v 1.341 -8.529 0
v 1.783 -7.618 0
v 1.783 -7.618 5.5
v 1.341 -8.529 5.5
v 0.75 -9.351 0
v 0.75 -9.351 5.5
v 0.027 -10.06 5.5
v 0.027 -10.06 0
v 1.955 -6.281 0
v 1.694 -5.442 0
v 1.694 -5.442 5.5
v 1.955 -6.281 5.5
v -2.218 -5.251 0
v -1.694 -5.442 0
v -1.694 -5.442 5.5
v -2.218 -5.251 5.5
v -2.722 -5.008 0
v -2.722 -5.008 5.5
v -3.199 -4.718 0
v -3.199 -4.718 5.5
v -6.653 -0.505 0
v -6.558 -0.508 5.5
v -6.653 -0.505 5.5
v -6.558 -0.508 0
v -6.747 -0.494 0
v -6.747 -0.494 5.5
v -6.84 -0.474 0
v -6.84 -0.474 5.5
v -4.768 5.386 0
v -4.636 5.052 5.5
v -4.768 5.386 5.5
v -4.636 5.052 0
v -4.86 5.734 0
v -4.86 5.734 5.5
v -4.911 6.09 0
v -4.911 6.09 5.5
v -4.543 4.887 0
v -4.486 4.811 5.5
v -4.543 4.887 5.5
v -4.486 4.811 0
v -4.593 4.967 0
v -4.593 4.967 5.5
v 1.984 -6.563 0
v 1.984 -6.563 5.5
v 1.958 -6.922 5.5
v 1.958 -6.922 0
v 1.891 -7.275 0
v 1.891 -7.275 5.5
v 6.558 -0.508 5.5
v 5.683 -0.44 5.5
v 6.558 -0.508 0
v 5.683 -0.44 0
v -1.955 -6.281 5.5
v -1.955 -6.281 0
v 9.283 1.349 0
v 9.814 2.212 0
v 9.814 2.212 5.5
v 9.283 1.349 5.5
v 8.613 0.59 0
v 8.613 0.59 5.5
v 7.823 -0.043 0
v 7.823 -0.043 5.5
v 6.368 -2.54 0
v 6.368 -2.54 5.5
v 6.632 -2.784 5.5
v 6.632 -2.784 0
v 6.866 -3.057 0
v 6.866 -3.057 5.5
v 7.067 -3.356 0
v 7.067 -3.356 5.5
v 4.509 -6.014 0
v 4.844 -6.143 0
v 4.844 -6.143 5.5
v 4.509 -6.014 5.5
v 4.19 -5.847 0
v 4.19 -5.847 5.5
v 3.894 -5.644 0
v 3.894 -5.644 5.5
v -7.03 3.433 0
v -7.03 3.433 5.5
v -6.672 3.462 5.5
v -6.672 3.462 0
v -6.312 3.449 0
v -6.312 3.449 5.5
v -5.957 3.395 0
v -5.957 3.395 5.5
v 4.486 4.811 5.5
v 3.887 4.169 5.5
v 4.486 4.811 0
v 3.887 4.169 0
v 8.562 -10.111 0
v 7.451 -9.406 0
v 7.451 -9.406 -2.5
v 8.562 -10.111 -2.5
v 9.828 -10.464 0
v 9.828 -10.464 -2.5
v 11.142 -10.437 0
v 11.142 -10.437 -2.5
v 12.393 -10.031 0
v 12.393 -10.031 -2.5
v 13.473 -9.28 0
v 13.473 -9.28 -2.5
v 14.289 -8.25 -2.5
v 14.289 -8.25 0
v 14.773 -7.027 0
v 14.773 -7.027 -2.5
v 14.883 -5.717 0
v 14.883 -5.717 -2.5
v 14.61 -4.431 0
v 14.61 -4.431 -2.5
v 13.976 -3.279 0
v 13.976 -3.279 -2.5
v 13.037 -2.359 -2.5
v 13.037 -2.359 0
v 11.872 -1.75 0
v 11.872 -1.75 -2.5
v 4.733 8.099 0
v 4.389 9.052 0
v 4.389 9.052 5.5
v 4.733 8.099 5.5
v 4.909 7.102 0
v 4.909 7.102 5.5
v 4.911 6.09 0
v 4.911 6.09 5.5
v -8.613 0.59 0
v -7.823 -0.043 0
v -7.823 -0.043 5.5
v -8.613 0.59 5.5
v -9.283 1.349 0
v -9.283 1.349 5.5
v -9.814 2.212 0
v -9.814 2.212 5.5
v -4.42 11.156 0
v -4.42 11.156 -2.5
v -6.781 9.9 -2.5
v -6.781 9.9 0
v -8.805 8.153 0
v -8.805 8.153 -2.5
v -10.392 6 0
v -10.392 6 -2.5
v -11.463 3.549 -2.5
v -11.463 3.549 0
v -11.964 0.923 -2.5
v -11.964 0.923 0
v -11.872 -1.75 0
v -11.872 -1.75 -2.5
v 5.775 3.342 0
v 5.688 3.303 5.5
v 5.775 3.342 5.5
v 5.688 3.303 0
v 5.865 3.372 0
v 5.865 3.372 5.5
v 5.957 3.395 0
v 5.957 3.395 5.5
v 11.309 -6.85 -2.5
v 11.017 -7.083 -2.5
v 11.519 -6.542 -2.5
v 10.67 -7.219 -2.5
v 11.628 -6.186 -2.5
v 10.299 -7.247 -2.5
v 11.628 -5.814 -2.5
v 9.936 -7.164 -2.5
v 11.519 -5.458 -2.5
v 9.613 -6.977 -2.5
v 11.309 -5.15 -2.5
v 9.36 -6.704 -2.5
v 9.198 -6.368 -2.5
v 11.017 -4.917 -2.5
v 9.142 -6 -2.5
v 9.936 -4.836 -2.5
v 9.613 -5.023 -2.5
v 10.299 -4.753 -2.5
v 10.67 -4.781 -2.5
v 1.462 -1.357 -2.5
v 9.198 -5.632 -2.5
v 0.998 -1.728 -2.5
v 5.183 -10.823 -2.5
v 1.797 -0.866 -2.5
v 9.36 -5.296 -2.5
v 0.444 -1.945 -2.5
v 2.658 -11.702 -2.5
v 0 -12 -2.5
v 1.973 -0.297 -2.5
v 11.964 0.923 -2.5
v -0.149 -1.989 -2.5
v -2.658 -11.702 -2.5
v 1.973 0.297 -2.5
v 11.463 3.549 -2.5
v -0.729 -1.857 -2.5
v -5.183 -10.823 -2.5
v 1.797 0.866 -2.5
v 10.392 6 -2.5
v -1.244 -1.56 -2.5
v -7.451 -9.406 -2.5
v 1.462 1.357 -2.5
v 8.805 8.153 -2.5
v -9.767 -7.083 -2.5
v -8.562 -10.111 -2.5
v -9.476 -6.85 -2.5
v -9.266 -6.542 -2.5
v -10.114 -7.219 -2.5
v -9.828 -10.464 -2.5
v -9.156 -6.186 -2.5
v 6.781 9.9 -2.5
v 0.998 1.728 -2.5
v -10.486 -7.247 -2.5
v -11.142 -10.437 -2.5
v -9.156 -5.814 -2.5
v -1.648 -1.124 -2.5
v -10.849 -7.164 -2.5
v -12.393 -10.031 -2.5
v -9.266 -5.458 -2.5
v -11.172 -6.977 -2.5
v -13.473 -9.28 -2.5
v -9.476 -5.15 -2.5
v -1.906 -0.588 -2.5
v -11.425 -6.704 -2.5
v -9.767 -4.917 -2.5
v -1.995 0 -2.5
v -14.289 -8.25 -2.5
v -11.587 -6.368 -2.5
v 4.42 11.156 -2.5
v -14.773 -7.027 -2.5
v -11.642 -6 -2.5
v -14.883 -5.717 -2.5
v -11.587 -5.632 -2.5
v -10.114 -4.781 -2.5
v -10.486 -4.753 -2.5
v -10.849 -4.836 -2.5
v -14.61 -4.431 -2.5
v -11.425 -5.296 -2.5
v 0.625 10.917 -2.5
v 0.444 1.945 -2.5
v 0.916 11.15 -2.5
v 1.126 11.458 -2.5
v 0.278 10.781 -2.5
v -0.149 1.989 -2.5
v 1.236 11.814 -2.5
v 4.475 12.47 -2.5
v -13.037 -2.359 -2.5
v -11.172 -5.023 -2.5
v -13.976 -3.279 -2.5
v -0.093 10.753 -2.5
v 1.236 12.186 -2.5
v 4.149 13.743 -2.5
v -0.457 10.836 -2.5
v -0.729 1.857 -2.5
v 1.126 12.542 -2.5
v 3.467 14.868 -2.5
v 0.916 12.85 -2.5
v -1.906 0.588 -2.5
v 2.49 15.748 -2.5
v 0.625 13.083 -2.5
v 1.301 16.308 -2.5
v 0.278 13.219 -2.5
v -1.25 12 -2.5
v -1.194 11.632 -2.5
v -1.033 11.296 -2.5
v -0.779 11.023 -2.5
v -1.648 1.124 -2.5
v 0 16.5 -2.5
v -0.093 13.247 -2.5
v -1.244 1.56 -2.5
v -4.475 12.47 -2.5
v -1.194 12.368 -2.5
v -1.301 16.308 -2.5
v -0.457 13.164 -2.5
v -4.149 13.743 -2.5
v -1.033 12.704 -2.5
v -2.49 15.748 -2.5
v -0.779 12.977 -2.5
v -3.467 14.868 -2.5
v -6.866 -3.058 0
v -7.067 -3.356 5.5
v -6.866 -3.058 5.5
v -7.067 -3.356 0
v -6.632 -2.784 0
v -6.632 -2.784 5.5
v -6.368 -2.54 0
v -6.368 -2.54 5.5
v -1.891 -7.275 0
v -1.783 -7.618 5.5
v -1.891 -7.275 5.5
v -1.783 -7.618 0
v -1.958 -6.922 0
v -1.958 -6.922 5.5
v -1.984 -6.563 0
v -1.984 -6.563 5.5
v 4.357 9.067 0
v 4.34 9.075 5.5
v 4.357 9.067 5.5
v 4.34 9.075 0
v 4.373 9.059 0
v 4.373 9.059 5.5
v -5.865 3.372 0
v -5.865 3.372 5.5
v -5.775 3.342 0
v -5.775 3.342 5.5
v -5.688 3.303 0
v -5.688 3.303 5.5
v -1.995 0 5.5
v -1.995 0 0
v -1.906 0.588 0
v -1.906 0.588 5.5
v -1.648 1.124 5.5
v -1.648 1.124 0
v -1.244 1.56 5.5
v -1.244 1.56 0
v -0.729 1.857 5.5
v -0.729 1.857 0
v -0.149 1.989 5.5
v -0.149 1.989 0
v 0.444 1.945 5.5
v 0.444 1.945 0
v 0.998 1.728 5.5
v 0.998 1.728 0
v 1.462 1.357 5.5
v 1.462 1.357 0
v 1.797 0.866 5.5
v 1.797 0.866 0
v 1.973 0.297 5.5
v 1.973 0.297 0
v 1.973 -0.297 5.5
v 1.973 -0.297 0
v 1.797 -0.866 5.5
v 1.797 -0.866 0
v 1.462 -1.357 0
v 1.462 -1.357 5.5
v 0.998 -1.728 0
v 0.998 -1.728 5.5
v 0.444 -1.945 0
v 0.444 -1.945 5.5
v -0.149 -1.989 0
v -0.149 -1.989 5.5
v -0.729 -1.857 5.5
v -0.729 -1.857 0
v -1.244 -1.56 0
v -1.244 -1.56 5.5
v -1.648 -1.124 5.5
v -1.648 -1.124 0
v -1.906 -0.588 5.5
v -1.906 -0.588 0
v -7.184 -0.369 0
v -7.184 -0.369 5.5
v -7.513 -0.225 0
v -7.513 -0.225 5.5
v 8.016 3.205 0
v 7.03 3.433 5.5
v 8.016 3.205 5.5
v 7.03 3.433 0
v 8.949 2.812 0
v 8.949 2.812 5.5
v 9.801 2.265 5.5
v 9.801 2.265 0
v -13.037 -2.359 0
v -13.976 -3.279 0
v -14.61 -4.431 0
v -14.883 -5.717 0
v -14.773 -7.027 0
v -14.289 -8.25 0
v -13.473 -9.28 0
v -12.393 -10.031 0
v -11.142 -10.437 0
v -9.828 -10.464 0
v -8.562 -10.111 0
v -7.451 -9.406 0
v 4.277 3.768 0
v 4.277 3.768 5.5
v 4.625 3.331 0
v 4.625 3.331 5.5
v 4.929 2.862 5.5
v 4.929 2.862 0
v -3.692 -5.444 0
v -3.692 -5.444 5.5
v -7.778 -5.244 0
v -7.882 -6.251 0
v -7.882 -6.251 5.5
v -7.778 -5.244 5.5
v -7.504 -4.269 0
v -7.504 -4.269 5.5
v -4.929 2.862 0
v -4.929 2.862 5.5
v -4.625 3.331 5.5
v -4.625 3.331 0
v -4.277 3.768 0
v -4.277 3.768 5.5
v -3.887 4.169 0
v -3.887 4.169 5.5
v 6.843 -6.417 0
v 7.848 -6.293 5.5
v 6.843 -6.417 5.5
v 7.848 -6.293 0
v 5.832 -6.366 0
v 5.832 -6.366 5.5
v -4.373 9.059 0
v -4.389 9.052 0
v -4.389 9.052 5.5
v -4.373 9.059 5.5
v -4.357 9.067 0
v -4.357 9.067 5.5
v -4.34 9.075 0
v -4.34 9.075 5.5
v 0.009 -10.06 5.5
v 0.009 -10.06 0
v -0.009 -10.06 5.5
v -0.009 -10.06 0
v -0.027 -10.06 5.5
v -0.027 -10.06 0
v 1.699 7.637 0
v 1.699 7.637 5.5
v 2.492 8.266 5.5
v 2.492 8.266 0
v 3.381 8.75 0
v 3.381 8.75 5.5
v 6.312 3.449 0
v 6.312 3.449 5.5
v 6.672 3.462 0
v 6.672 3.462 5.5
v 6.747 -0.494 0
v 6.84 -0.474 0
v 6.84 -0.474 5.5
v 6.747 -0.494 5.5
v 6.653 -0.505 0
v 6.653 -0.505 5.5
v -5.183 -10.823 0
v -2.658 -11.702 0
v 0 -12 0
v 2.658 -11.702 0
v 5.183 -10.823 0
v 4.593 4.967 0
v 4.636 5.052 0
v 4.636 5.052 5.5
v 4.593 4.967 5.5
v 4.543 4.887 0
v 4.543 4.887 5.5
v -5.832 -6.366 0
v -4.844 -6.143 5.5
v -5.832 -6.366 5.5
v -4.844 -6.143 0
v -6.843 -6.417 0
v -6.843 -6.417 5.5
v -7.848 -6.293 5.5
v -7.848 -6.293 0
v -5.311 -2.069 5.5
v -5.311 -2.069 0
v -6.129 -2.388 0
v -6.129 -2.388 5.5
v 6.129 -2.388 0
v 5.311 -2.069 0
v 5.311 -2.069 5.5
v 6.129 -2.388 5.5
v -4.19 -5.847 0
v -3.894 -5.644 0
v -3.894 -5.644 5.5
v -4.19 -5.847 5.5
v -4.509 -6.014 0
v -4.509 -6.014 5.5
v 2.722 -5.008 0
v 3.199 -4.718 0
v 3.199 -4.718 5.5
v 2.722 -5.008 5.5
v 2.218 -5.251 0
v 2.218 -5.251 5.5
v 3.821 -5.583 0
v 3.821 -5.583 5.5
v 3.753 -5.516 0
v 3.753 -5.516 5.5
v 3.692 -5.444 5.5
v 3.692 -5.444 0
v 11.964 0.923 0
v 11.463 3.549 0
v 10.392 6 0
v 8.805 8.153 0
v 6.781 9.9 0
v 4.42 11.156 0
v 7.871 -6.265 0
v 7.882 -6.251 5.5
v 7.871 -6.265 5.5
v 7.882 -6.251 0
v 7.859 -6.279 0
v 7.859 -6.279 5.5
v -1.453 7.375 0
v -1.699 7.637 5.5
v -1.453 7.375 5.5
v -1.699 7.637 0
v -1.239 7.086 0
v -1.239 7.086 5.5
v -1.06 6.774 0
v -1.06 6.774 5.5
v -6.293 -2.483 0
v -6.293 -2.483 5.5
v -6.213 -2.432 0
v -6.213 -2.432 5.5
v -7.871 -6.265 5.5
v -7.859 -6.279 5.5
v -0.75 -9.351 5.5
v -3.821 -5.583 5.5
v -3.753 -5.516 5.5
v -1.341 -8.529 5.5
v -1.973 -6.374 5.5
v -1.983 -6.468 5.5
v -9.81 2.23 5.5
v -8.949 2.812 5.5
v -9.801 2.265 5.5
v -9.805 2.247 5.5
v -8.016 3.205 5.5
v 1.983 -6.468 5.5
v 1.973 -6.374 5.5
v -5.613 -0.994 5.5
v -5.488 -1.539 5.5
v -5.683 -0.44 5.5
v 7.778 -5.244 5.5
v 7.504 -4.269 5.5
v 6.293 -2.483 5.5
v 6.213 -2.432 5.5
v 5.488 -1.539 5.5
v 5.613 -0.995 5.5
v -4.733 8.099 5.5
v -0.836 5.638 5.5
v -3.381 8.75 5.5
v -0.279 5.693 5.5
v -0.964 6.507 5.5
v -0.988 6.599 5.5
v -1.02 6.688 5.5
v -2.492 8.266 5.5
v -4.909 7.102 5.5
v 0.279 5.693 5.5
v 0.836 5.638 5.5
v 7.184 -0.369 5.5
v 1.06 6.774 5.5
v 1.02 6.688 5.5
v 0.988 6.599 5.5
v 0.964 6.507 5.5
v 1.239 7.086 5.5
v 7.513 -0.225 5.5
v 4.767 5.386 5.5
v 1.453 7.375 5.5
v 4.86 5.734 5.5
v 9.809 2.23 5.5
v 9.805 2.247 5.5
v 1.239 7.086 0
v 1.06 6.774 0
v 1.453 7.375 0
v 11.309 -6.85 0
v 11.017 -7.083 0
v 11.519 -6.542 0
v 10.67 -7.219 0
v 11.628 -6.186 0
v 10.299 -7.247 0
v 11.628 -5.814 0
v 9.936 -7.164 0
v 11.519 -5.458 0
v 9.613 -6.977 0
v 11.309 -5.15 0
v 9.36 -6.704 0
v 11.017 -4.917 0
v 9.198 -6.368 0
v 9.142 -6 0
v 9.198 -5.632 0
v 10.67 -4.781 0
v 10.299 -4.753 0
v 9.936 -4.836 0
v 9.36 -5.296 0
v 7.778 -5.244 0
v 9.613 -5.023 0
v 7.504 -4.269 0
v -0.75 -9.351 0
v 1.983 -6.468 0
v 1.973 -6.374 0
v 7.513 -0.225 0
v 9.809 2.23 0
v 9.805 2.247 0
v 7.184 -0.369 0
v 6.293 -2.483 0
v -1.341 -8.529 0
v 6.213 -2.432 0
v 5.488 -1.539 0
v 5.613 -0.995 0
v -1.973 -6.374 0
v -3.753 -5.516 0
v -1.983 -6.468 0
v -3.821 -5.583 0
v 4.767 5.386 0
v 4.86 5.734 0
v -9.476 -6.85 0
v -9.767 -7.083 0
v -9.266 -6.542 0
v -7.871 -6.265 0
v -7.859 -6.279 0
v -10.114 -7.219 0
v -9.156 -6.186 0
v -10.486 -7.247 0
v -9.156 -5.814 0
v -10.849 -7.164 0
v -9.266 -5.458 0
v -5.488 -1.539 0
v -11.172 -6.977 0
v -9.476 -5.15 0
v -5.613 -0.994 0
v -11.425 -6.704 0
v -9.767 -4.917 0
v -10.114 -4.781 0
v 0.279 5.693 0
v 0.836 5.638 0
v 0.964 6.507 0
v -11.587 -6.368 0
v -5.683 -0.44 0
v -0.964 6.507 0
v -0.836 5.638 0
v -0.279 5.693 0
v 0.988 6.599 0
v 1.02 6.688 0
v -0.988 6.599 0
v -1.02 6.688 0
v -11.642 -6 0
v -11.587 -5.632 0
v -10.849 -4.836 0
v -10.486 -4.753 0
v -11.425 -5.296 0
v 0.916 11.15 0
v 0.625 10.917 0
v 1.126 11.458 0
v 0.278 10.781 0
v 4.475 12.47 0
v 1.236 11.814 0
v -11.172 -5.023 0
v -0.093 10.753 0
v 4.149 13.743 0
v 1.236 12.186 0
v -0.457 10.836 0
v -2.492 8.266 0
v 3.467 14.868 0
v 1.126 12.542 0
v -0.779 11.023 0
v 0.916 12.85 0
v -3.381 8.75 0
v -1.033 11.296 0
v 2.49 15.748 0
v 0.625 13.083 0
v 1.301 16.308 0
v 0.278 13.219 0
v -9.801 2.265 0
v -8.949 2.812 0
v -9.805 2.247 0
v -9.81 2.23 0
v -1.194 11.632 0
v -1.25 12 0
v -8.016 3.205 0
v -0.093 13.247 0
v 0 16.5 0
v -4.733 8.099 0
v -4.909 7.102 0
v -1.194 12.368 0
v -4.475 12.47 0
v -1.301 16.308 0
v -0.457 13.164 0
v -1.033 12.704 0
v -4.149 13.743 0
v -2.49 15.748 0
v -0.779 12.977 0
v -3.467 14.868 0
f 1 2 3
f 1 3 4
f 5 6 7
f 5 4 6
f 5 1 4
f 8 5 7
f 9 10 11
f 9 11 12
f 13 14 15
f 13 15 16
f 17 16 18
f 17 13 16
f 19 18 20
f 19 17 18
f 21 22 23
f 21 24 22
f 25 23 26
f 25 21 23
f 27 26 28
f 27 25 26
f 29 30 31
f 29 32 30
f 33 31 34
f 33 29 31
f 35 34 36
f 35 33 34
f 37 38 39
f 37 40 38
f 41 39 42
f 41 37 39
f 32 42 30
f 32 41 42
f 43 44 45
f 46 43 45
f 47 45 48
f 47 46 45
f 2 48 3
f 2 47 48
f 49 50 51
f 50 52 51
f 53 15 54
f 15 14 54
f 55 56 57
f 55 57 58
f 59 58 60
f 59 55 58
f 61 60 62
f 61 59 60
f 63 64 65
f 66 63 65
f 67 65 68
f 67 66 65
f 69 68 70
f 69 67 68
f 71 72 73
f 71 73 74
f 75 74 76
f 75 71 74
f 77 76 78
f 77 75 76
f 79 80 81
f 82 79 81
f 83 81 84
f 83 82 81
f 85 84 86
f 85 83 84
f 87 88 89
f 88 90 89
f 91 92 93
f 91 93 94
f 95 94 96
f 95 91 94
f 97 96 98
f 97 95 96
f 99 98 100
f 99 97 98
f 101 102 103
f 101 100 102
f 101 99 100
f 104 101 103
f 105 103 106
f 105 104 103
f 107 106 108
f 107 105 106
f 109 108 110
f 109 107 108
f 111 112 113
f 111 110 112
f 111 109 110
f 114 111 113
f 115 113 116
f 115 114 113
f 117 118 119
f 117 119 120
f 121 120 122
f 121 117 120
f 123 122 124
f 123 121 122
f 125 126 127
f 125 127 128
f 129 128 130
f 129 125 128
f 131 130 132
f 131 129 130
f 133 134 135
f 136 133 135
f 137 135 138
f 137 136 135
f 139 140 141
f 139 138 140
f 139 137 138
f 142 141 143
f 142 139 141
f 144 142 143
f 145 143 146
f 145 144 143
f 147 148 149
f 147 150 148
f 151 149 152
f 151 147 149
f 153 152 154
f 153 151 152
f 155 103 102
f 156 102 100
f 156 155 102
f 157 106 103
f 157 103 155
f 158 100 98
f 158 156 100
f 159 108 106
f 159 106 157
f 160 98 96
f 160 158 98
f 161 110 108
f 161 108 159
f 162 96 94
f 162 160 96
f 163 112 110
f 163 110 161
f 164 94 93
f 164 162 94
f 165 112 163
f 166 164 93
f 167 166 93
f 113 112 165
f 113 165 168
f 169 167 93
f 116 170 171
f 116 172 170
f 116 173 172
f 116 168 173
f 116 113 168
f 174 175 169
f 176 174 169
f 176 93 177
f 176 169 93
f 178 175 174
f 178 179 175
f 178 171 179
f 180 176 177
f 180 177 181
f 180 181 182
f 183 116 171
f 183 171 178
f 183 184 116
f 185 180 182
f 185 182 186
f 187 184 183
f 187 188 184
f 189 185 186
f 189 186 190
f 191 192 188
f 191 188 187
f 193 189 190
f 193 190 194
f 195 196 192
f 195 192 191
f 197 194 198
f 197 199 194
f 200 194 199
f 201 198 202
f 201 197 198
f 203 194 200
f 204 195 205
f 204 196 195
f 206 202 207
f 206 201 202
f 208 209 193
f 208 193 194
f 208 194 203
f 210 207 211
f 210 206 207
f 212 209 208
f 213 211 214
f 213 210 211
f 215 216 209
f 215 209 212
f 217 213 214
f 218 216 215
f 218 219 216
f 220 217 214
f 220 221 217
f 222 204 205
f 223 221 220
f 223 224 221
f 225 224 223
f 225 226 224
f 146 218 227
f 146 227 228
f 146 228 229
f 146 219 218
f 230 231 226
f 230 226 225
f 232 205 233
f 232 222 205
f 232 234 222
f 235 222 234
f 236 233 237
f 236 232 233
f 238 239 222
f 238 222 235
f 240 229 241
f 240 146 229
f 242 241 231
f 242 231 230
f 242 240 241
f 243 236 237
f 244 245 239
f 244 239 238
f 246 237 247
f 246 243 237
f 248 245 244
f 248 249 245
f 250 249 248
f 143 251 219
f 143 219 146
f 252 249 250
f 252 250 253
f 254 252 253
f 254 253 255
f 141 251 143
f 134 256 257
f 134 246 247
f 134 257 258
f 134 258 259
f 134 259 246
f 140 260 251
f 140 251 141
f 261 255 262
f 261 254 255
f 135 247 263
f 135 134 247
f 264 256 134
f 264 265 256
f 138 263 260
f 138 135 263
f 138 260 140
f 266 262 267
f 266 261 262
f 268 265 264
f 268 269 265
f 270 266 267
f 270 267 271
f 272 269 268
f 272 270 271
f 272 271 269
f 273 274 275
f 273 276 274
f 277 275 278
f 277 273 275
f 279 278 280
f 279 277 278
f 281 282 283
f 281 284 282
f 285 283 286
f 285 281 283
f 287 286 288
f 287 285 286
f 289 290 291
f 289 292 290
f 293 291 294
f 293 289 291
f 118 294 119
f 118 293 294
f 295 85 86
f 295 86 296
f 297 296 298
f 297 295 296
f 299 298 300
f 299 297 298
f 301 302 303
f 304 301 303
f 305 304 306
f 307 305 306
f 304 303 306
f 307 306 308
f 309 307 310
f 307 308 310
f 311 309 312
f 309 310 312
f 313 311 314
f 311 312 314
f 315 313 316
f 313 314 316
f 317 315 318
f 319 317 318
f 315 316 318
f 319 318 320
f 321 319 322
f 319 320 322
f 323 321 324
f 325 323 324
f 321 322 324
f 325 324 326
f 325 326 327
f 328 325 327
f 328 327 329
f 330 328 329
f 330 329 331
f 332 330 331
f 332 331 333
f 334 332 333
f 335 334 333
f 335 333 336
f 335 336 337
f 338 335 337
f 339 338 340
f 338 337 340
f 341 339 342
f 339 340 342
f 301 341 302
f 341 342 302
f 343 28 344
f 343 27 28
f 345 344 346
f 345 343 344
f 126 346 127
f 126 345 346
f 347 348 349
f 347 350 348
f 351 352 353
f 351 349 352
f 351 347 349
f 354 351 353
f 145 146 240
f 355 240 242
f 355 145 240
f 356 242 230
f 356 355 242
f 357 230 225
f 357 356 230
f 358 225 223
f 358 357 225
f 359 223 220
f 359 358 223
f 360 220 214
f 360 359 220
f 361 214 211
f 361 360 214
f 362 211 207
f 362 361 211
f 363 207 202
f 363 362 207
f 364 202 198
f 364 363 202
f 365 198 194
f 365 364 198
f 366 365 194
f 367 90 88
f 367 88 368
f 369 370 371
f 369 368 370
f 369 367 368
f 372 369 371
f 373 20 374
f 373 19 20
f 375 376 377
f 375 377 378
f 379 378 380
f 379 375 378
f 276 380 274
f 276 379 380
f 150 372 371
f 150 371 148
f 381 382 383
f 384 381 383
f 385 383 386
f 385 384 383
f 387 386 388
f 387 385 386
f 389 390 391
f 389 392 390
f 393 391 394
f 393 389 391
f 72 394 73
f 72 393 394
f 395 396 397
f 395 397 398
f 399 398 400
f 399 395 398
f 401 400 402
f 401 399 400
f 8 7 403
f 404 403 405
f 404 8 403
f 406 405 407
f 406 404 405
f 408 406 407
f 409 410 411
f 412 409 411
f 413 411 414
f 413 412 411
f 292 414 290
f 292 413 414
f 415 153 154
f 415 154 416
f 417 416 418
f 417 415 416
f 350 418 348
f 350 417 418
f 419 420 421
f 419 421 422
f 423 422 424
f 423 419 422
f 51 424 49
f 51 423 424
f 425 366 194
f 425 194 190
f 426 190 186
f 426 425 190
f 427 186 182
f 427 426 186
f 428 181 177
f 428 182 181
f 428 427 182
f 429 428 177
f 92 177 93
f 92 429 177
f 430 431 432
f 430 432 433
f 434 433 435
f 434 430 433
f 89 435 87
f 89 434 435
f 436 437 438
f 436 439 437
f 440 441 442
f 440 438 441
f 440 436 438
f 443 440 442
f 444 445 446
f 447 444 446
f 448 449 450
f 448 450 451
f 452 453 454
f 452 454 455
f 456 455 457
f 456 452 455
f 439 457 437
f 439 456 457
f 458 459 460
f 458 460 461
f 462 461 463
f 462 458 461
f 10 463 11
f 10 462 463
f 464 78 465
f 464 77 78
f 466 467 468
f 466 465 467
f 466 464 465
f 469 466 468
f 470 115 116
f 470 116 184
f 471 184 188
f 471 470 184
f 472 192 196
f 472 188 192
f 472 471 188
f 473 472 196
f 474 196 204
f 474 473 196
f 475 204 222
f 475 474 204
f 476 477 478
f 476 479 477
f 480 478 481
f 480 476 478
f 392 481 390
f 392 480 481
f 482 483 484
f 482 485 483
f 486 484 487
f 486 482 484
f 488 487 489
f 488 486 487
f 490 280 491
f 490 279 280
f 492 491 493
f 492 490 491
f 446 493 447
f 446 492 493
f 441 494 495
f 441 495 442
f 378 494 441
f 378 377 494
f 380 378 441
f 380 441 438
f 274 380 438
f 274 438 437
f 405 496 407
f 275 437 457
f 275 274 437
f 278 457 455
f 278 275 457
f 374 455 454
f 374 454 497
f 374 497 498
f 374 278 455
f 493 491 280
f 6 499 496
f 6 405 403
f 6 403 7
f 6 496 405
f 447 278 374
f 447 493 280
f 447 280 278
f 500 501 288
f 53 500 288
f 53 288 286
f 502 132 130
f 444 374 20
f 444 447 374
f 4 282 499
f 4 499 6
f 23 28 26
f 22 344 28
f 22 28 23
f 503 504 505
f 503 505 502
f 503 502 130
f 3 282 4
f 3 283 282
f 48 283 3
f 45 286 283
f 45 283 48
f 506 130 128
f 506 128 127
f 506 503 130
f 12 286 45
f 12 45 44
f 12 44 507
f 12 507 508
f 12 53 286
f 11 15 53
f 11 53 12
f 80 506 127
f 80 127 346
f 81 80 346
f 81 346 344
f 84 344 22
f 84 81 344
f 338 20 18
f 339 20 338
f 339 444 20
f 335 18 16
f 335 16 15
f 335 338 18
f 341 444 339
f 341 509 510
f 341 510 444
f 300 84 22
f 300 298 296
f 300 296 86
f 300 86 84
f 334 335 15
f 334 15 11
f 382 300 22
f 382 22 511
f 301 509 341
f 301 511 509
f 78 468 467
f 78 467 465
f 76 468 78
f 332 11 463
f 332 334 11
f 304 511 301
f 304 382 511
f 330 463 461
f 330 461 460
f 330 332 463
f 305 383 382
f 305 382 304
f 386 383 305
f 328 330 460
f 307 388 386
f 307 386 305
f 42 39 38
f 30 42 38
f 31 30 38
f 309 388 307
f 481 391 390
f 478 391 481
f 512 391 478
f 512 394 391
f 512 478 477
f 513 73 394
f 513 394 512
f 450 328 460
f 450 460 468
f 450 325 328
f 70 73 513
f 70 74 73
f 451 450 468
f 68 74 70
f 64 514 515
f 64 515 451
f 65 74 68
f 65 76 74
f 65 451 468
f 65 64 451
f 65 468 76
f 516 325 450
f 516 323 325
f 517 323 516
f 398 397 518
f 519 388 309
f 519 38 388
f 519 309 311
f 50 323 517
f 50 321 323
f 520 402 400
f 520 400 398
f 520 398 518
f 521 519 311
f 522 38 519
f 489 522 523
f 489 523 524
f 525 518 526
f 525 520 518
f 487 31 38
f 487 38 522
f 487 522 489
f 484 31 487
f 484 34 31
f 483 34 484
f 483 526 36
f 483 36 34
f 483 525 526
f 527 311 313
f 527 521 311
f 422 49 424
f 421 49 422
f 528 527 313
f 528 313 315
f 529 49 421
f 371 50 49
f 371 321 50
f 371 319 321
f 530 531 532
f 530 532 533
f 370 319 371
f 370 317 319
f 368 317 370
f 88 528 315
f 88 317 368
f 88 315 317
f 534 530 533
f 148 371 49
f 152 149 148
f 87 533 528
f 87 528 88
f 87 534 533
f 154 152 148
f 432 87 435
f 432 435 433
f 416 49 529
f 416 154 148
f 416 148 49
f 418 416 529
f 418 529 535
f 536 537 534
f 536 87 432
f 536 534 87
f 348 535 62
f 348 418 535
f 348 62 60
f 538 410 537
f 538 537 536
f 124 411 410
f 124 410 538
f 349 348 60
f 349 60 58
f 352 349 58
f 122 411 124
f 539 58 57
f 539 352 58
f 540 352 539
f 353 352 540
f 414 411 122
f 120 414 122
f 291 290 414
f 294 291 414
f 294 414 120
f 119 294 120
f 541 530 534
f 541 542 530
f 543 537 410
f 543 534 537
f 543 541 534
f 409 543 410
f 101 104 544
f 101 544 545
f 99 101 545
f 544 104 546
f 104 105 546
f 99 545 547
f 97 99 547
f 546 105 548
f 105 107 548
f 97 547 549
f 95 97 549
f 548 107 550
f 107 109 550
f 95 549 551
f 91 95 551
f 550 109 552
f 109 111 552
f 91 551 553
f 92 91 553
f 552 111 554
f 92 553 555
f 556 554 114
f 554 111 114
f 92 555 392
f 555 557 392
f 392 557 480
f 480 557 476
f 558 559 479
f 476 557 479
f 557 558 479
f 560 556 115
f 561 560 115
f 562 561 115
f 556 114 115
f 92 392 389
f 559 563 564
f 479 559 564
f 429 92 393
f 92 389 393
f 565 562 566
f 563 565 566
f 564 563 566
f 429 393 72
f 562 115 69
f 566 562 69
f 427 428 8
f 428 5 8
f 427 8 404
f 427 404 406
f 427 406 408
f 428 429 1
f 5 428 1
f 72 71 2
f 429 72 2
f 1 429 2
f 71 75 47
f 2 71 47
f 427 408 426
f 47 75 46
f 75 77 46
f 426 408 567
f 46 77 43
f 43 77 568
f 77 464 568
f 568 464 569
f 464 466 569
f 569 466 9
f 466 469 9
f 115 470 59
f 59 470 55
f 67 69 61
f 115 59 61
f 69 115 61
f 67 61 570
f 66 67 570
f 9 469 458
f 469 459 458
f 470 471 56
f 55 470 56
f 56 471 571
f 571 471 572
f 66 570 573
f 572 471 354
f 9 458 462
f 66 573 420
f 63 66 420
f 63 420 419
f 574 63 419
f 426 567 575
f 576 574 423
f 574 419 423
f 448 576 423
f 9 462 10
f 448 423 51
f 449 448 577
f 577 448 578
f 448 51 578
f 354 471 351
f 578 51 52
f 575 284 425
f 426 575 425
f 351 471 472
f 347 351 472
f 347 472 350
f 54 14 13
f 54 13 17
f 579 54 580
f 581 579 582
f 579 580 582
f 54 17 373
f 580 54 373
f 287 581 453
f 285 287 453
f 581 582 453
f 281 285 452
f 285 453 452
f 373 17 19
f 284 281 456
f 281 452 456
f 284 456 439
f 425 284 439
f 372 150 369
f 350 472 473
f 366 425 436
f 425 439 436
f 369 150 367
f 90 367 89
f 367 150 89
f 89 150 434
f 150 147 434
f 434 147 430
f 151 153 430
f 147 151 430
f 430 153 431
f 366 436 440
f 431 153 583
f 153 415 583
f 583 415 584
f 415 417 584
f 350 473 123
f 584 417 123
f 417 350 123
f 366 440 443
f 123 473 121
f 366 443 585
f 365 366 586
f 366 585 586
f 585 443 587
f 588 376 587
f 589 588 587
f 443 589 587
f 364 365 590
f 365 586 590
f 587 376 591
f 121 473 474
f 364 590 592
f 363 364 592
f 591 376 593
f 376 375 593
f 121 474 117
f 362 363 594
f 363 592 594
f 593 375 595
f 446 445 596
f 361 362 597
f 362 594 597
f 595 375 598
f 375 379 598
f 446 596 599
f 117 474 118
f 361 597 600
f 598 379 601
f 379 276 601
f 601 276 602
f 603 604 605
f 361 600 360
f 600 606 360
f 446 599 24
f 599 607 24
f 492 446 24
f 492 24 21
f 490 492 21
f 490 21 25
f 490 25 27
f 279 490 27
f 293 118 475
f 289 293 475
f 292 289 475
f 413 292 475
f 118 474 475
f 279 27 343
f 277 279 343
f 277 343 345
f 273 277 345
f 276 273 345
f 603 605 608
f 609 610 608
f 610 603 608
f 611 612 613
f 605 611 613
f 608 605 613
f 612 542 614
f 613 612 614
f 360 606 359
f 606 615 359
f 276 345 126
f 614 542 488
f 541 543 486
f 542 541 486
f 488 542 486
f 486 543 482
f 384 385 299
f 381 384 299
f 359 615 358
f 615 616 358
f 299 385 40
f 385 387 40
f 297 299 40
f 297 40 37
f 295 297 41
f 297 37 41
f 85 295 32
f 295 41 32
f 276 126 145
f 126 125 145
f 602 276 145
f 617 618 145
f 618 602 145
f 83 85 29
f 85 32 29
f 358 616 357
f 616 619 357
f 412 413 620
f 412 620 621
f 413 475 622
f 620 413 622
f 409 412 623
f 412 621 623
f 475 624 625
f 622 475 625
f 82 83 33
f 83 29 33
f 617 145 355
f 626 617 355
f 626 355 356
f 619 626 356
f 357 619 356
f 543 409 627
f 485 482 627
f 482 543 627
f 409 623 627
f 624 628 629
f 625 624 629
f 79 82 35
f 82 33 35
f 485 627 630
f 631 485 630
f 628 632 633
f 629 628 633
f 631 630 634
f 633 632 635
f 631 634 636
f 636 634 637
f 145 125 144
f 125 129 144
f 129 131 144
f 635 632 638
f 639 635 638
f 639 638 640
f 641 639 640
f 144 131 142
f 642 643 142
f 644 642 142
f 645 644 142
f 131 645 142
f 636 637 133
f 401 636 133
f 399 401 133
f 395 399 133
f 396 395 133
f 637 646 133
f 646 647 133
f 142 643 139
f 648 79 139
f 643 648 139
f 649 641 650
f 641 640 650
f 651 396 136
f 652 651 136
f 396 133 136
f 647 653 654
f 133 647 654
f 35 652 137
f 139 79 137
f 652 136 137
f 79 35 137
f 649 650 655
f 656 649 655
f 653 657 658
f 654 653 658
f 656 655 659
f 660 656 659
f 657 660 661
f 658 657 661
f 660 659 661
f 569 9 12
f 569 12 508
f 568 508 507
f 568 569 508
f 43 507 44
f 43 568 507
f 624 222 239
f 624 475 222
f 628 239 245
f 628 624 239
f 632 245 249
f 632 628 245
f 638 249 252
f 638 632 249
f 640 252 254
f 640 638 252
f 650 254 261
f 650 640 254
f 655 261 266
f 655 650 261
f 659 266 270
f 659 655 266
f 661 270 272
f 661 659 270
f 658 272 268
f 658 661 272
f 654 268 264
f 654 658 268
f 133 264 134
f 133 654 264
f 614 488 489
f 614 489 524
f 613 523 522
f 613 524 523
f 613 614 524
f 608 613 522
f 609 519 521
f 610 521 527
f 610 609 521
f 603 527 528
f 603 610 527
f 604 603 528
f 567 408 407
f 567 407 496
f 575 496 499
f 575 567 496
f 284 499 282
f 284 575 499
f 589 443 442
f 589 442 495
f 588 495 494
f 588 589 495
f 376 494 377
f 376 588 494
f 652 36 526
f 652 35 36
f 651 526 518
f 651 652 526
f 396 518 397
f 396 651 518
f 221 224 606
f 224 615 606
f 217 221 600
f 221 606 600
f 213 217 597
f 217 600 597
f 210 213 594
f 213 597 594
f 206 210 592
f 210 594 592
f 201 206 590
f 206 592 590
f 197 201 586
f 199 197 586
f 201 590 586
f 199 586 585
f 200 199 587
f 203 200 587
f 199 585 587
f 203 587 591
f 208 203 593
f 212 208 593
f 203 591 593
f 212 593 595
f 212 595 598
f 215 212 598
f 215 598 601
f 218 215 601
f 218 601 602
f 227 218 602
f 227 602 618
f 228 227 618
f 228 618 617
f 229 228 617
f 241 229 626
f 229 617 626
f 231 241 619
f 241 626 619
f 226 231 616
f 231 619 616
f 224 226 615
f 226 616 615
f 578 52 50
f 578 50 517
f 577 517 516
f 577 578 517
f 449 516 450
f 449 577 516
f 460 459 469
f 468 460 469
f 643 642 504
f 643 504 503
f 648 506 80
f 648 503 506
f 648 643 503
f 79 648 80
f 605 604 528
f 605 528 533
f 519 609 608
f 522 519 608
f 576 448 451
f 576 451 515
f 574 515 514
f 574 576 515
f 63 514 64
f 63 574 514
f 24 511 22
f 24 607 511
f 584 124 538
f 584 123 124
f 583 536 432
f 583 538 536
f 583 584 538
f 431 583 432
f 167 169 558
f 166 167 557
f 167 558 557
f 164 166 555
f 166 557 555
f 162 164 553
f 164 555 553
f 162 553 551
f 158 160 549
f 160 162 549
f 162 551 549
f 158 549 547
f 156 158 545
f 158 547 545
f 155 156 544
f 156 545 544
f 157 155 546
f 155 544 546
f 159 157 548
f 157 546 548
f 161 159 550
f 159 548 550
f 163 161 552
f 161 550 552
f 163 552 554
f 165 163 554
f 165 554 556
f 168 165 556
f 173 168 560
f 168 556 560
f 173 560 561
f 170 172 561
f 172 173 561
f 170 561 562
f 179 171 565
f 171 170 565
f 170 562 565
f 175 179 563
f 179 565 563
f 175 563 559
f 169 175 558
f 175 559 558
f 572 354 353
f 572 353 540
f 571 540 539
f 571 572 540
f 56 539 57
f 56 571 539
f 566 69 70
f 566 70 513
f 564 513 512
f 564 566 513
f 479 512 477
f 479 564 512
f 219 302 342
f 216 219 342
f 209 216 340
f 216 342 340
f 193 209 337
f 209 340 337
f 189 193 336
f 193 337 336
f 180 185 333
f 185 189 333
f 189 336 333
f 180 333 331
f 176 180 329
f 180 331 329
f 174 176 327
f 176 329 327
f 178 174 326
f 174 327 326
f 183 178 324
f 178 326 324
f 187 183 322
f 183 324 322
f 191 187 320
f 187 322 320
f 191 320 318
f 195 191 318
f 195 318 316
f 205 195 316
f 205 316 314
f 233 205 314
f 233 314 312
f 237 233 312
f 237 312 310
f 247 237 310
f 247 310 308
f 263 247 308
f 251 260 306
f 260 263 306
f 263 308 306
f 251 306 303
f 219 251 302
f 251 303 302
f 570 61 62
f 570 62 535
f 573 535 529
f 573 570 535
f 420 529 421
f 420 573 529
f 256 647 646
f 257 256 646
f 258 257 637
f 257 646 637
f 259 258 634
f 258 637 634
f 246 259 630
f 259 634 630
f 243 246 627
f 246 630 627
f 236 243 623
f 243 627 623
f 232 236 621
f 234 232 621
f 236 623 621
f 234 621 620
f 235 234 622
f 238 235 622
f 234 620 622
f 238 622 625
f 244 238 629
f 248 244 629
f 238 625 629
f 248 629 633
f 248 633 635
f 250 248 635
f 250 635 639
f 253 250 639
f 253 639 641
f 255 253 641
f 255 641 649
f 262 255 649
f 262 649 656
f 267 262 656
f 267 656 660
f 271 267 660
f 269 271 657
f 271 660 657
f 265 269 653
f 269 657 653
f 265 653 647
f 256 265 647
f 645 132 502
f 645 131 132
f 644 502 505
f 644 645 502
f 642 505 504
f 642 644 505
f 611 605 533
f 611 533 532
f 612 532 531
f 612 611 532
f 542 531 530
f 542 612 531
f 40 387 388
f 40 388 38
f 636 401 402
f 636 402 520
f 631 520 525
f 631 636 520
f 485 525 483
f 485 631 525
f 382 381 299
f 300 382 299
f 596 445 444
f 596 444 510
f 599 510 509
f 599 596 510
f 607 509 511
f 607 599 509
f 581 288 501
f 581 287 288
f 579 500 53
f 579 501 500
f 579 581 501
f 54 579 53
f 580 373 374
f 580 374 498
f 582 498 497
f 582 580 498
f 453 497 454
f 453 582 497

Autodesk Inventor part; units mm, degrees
ref_plane "YZ Plane" through (0, 0, 0) normal (1, 0, 0) x (0, 1, 0)
ref_plane "XZ Plane" through (0, 0, 0) normal (0, 1, 0) x (-1, 0, 0)
ref_plane "XY Plane" through (0, 0, 0) normal (0, 0, 1) x (1, 0, 0)
sketch "スケッチ1" plane through (0, 0, 0) normal (0, 0, 1) x (1, 0, 0)
  arc A0 (1.0596, 6.774) -> (0.9641, 6.5068) centre (2.0212, 6.2798) ccw
  arc A1 (1.6991, 7.6367) -> (1.0596, 6.774) centre (3.8299, 5.389) ccw
  arc A2 (4.3402, 9.0752) -> (1.6991, 7.6367) centre (5.7463, 3.3497) ccw
  arc A3 (-4.6355, 5.052) -> (-4.4861, 4.8107) centre (-3.6495, 5.4956) ccw
  arc A4 (-4.9113, 6.0898) -> (-4.6355, 5.052) centre (-1.8254, 6.3543) ccw
  arc A5 (-4.3892, 9.0516) -> (-4.9113, 6.0898) centre (0.9639, 6.5812) ccw
  arc A6 (-6.84, -0.4743) -> (-6.5582, -0.508) centre (-6.5721, 0.5731) ccw
  arc A7 (-7.8233, -0.0429) -> (-6.84, -0.4743) centre (-6.1061, 2.5347) ccw
  arc A8 (-9.8135, 2.2119) -> (-7.8233, -0.0429) centre (-4.5444, 4.8569) ccw
  arc A9 (-3.8938, -5.6435) -> (-3.6918, -5.4441) centre (-4.5457, -4.7809) ccw
  arc A10 (-4.8442, -6.1433) -> (-3.8938, -5.6435) centre (-5.7888, -3.1936) ccw
  arc A11 (-7.848, -6.2934) -> (-4.8442, -6.1433) centre (-6.6307, -0.5248) ccw
  arc A12 (1.9845, -6.5629) -> (1.9546, -6.2807) centre (0.9037, -6.5348) ccw
  arc A13 (1.7827, -7.6176) -> (1.9845, -6.5629) centre (-1.1124, -6.517) ccw
  arc A14 (0.0272, -10.0597) -> (1.7827, -7.6176) centre (-3.7239, -5.5113) ccw
  arc A15 (6.3684, -2.5404) -> (6.1291, -2.3878) centre (5.6726, -3.3679) ccw
  arc A16 (7.0672, -3.3558) -> (6.3684, -2.5404) centre (4.4016, -4.933) ccw
  arc A17 (7.8819, -6.2508) -> (7.0672, -3.3558) centre (1.9871, -6.3477) ccw
  arc A18 (5.9568, 3.3951) -> (5.6883, 3.3032) centre (6.1699, 2.3351) ccw
  arc A19 (7.03, 3.433) -> (5.9568, 3.3951) centre (6.6011, 0.3656) ccw
  arc A20 (9.8014, 2.265) -> (7.03, 3.433) centre (6.2017, -2.4041) ccw
  arc A21 (-0.9641, 6.5068) -> (-1.0596, 6.774) centre (-2.0212, 6.2798) ccw
  arc A22 (-1.0596, 6.774) -> (-1.6991, 7.6367) centre (-3.8299, 5.389) ccw
  arc A23 (-1.6991, 7.6367) -> (-4.3402, 9.0752) centre (-5.7463, 3.3497) ccw
  arc A24 (-5.6883, 3.3032) -> (-5.9568, 3.3951) centre (-6.1699, 2.3351) ccw
  arc A25 (-5.9568, 3.3951) -> (-7.03, 3.433) centre (-6.6011, 0.3656) ccw
  arc A26 (-7.03, 3.433) -> (-9.8014, 2.265) centre (-6.2017, -2.4041) ccw
  arc A27 (-6.1291, -2.3878) -> (-6.3684, -2.5404) centre (-5.6726, -3.3679) ccw
  arc A28 (-6.3684, -2.5404) -> (-7.0672, -3.3558) centre (-4.4016, -4.933) ccw
  arc A29 (-7.0672, -3.3558) -> (-7.8819, -6.2508) centre (-1.9871, -6.3477) ccw
  arc A30 (-1.9546, -6.2807) -> (-1.9845, -6.5629) centre (-0.9037, -6.5348) ccw
  arc A31 (-1.9845, -6.5629) -> (-1.7827, -7.6176) centre (1.1124, -6.517) ccw
  arc A32 (-1.7827, -7.6176) -> (-0.0272, -10.0597) centre (3.7239, -5.5113) ccw
  arc A33 (3.6918, -5.4441) -> (3.8938, -5.6435) centre (4.5457, -4.7809) ccw
  arc A34 (3.8938, -5.6435) -> (4.8442, -6.1433) centre (5.7888, -3.1936) ccw
  arc A35 (4.8442, -6.1433) -> (7.848, -6.2934) centre (6.6307, -0.5248) ccw
  arc A36 (6.5582, -0.508) -> (6.84, -0.4743) centre (6.5721, 0.5731) ccw
  arc A37 (6.84, -0.4743) -> (7.8233, -0.0429) centre (6.1061, 2.5347) ccw
  arc A38 (7.8233, -0.0429) -> (9.8135, 2.2119) centre (4.5444, 4.8569) ccw
  arc A39 (4.4861, 4.8107) -> (4.6355, 5.052) centre (3.6495, 5.4956) ccw
  arc A40 (4.6355, 5.052) -> (4.9113, 6.0898) centre (1.8254, 6.3543) ccw
  arc A41 (4.9113, 6.0898) -> (4.3892, 9.0516) centre (-0.9639, 6.5812) ccw
  arc A42 (0.8355, 5.6384) -> (-0.8355, 5.6384) centre (0, 0) ccw
  arc A43 (-3.8874, 4.1687) -> (-4.9292, 2.8623) centre (0, 0) ccw
  arc A44 (-5.683, -0.4402) -> (-5.3112, -2.0692) centre (0, 0) ccw
  arc A45 (-3.1991, -4.7176) -> (-1.6937, -5.4425) centre (0, 0) ccw
  arc A46 (1.6937, -5.4425) -> (3.1991, -4.7176) centre (0, 0) ccw
  arc A47 (5.3112, -2.0692) -> (5.683, -0.4402) centre (0, 0) ccw
  arc A48 (4.9292, 2.8623) -> (3.8874, 4.1687) centre (0, 0) ccw
  arc A49 (-4.3402, 9.0752) -> (-4.3892, 9.0516) centre (0, 0) ccw
  arc A50 (-9.8014, 2.265) -> (-9.8135, 2.2119) centre (0, 0) ccw
  arc A51 (-7.8819, -6.2508) -> (-7.848, -6.2934) centre (0, 0) ccw
  arc A52 (-0.0272, -10.0597) -> (0.0272, -10.0597) centre (0, 0) ccw
  arc A53 (7.848, -6.2934) -> (7.8819, -6.2508) centre (0, 0) ccw
  arc A54 (9.8135, 2.2119) -> (9.8014, 2.265) centre (0, 0) ccw
  arc A55 (4.3892, 9.0516) -> (4.3402, 9.0752) centre (0, 0) ccw
  line L0 (0.8355, 5.6384) -> (0.9641, 6.5068)
  line L1 (-3.8874, 4.1687) -> (-4.4861, 4.8107)
  line L2 (-5.683, -0.4402) -> (-6.5582, -0.508)
  line L3 (-3.1991, -4.7176) -> (-3.6918, -5.4441)
  line L4 (1.6937, -5.4425) -> (1.9546, -6.2807)
  line L5 (5.3112, -2.0692) -> (6.1291, -2.3878)
  line L6 (4.9292, 2.8623) -> (5.6883, 3.3032)
  line L7 (-0.8355, 5.6384) -> (-0.9641, 6.5068)
  line L8 (-4.9292, 2.8623) -> (-5.6883, 3.3032)
  line L9 (-5.3112, -2.0692) -> (-6.1291, -2.3878)
  line L10 (-1.6937, -5.4425) -> (-1.9546, -6.2807)
  line L11 (3.1991, -4.7176) -> (3.6918, -5.4441)
  line L12 (5.683, -0.4402) -> (6.5582, -0.508)
  line L13 (3.8874, 4.1687) -> (4.4861, 4.8107)
  line L14 (-12.0597, 0) -> (12.0597, 0)
  line L15 (0, -12.0597) -> (0, 12.0597)
  line L16 (30.0597, 10.0597) -> (100.0597, 10.0597)
  line L17 (30.0597, 2.0597) -> (100.0597, 2.0597)
  line L18 (30.0597, -5.9403) -> (100.0597, -5.9403)
  line L19 (30.0597, -13.9403) -> (100.0597, -13.9403)
  line L20 (30.0597, -21.9403) -> (100.0597, -21.9403)
  line L21 (30.0597, -29.9403) -> (100.0597, -29.9403)
  line L22 (30.0597, -37.9403) -> (100.0597, -37.9403)
  line L23 (30.0597, -45.9403) -> (100.0597, -45.9403)
  line L24 (30.0597, -53.9403) -> (100.0597, -53.9403)
  line L25 (30.0597, -61.9403) -> (100.0597, -61.9403)
  line L26 (30.0597, -69.9403) -> (100.0597, -69.9403)
  line L27 (30.0597, -77.9403) -> (100.0597, -77.9403)
  line L28 (30.0597, -85.9403) -> (100.0597, -85.9403)
  line L29 (30.0597, 10.0597) -> (30.0597, -85.9403)
  line L30 (100.0597, 10.0597) -> (100.0597, -85.9403)
  line L31 (65.0597, 2.0597) -> (65.0597, -85.9403)
  point P0 (0, 0)
  point P1 (36.0597, 4.0597)
  point P2 (38.5597, -3.9403)
  point P3 (38.5597, -11.9403)
  point P4 (36.0597, -19.9403)
  point P5 (38.5597, -27.9403)
  point P6 (33.5597, -35.9403)
  point P7 (36.0597, -43.9403)
  point P8 (36.0597, -51.9403)
  point P9 (36.0597, -59.9403)
  point P10 (38.5597, -67.9403)
  point P11 (38.5597, -75.9403)
  point P12 (36.0597, -83.9403)
  point P13 (66.0597, -3.9403)
  point P14 (82.3097, -11.9403)
  point P15 (82.3097, -19.9403)
  point P16 (78.5597, -27.9403)
  point P17 (81.0597, -35.9403)
  point P18 (74.8097, -43.9403)
  point P19 (74.8097, -51.9403)
  point P20 (78.5597, -59.9403)
  point P21 (76.0597, -67.9403)
  point P22 (1, 25.5597)
  point P23 (1, 19.5597)
  point P24 (18.25, 25.5597)
  point P25 (20.375, 19.5597)
extrude "押し出し1" add sketch "スケッチ1" along normal blind 5.5 contours A1 A2 A55 A41 A40 A39 L13 A48 L6 A18 A19 A20 A54 A38 L14 L15 A42 L0 A0 | L15 L14 A8 A50 A26 A25 A24 L8 A43 L1 A3 A4 A5 A49 A23 A22 A21 L7 A42 | L15 A52 A32 A31 A30 L10 A45 L3 A9 A10 A11 A51 A29 A28 A27 L9 A44 L2 A6 A7 A8 L14 | L14 A38 A37 A36 L12 A47 L5 A15 A16 A17 A53 A35 A34 A33 L11 A46 L4 A12 A13 A14 A52 L15
sketch "スケッチ2" plane through (0, 0, 0) normal (0, 0, -1) x (-1, 0, 0)
  circle A0 centre (0, 0) radius 1.995
  line L0 (0, 12) -> (10.3923, -6) construction
  line L1 (10.3923, -6) -> (-10.3923, -6) construction
  line L2 (-10.3923, -6) -> (0, 12) construction
  circle A1 centre (-10.3923, -6) radius 1.25
  circle A2 centre (0, 12) radius 1.25
  circle A3 centre (10.3923, -6) radius 1.25
  arc A4 (-4.3402, 9.0752) -> (-4.3892, 9.0516) centre (0, 0) ccw projected
  circle A5 centre (0, 0) radius 10.0597 construction
  circle A6 centre (0, 0) radius 12
  circle A7 centre (0, 12) radius 4.5
  circle A8 centre (10.3923, -6) radius 4.5
  circle A9 centre (-10.3923, -6) radius 4.5
  circle A10 centre (0, 0) radius 16.5 construction
  point P0 (-11.8717, -1.7501)
  point P1 (-7.4515, -9.4061)
  point P2 (9.7118, -7.0485)
  point P3 (10.9601, -4.8864)
  point P4 (1.2483, 11.9349)
  point P5 (-1.2483, 11.9349)
  point P6 (11.8717, -1.7501)
  point P7 (7.4515, -9.4061)
  point P8 (-4.4202, 11.1563)
  point P9 (4.4202, 11.1563)
  dimension "d2" = 3.99
  dimension "d3" = 2.5
  dimension "d4" = 2.5
  dimension "d5" = 2.5
  dimension "d6" = 12
  dimension "d14" = 9
  dimension "d15" = 9
  dimension "d16" = 9
extrude "押し出し2" add sketch "スケッチ2" along normal blind 2.5 contours A1 A6 A9 | A1 A6 A9 | A6 A7 A8 A9 | A7 A6 A2 | A6 A2 A7 | A8 A6 A3 | A6 A3 A8
sketch "スケッチ3" plane through (0, 0, 0) normal (0, 0, -1) x (-1, 0, 0)
  circle A0 centre (0, 0) radius 1.995 projected
extrude "押し出し3" cut sketch "スケッチ3" against normal through all
sketch "スケッチ4" plane through (0, 0, 5.5) normal (0, 0, 1) x (1, 0, 0)
  arc A0 (11.8717, -1.7501) -> (4.4202, 11.1563) centre (0, 0) ccw projected
  arc A1 (4.4202, 11.1563) -> (-4.4202, 11.1563) centre (0, 12) ccw projected
  arc A2 (-4.4202, 11.1563) -> (-11.8717, -1.7501) centre (0, 0) ccw projected
  arc A3 (-11.8717, -1.7501) -> (-7.4515, -9.4061) centre (-10.3923, -6) ccw projected
  arc A4 (-7.4515, -9.4061) -> (7.4515, -9.4061) centre (0, 0) ccw projected
  arc A5 (7.4515, -9.4061) -> (11.8717, -1.7501) centre (10.3923, -6) ccw projected
  circle A6 centre (0, 12) radius 1.25 projected
  circle A7 centre (10.3923, -6) radius 1.25 projected
  circle A8 centre (-10.3923, -6) radius 1.25 projected
  arc A9 (7.848, -6.2934) -> (7.8819, -6.2508) centre (0, 0) ccw projected
  arc A10 (4.8442, -6.1433) -> (7.848, -6.2934) centre (6.6307, -0.5248) ccw projected
  arc A11 (3.8938, -5.6435) -> (4.8442, -6.1433) centre (5.7888, -3.1936) ccw projected
  arc A12 (3.6918, -5.4441) -> (3.8938, -5.6435) centre (4.5457, -4.7809) ccw projected
  line L0 (3.1991, -4.7176) -> (3.6918, -5.4441) projected
  arc A13 (1.6937, -5.4425) -> (3.1991, -4.7176) centre (0, 0) ccw projected
  line L1 (1.9546, -6.2807) -> (1.6937, -5.4425) projected
  arc A14 (1.9845, -6.5629) -> (1.9546, -6.2807) centre (0.9037, -6.5348) ccw projected
  arc A15 (1.7827, -7.6176) -> (1.9845, -6.5629) centre (-1.1124, -6.517) ccw projected
  arc A16 (0.0272, -10.0597) -> (1.7827, -7.6176) centre (-3.7239, -5.5113) ccw projected
  arc A17 (-0.0272, -10.0597) -> (0.0272, -10.0597) centre (0, 0) ccw projected
  arc A18 (-1.7827, -7.6176) -> (-0.0272, -10.0597) centre (3.7239, -5.5113) ccw projected
  arc A19 (-1.9845, -6.5629) -> (-1.7827, -7.6176) centre (1.1124, -6.517) ccw projected
  arc A20 (-1.9546, -6.2807) -> (-1.9845, -6.5629) centre (-0.9037, -6.5348) ccw projected
  line L2 (-1.6937, -5.4425) -> (-1.9546, -6.2807) projected
  arc A21 (-3.1991, -4.7176) -> (-1.6937, -5.4425) centre (0, 0) ccw projected
  line L3 (-3.6918, -5.4441) -> (-3.1991, -4.7176) projected
  arc A22 (-3.8938, -5.6435) -> (-3.6918, -5.4441) centre (-4.5457, -4.7809) ccw projected
  arc A23 (-4.8442, -6.1433) -> (-3.8938, -5.6435) centre (-5.7888, -3.1936) ccw projected
  arc A24 (-7.848, -6.2934) -> (-4.8442, -6.1433) centre (-6.6307, -0.5248) ccw projected
  arc A25 (-7.8819, -6.2508) -> (-7.848, -6.2934) centre (0, 0) ccw projected
  arc A26 (-7.0672, -3.3558) -> (-7.8819, -6.2508) centre (-1.9871, -6.3477) ccw projected
  arc A27 (-6.3684, -2.5404) -> (-7.0672, -3.3558) centre (-4.4016, -4.933) ccw projected
  arc A28 (-6.1291, -2.3878) -> (-6.3684, -2.5404) centre (-5.6726, -3.3679) ccw projected
  line L4 (-5.3112, -2.0692) -> (-6.1291, -2.3878) projected
  arc A29 (-5.683, -0.4402) -> (-5.3112, -2.0692) centre (0, 0) ccw projected
  line L5 (-6.5582, -0.508) -> (-5.683, -0.4402) projected
  arc A30 (-6.84, -0.4743) -> (-6.5582, -0.508) centre (-6.5721, 0.5731) ccw projected
  arc A31 (-7.8233, -0.0429) -> (-6.84, -0.4743) centre (-6.1061, 2.5347) ccw projected
  arc A32 (-9.8135, 2.2119) -> (-7.8233, -0.0429) centre (-4.5444, 4.8569) ccw projected
  arc A33 (-9.8014, 2.265) -> (-9.8135, 2.2119) centre (0, 0) ccw projected
  arc A34 (-7.03, 3.433) -> (-9.8014, 2.265) centre (-6.2017, -2.4041) ccw projected
  arc A35 (-5.9568, 3.3951) -> (-7.03, 3.433) centre (-6.6011, 0.3656) ccw projected
  arc A36 (-5.6883, 3.3032) -> (-5.9568, 3.3951) centre (-6.1699, 2.3351) ccw projected
  line L6 (-4.9292, 2.8623) -> (-5.6883, 3.3032) projected
  arc A37 (-3.8874, 4.1687) -> (-4.9292, 2.8623) centre (0, 0) ccw projected
  line L7 (-4.4861, 4.8107) -> (-3.8874, 4.1687) projected
  arc A38 (-4.6355, 5.052) -> (-4.4861, 4.8107) centre (-3.6495, 5.4956) ccw projected
  arc A39 (-4.9113, 6.0898) -> (-4.6355, 5.052) centre (-1.8254, 6.3543) ccw projected
  arc A40 (-4.3892, 9.0516) -> (-4.9113, 6.0898) centre (0.9639, 6.5812) ccw projected
  arc A41 (-4.3402, 9.0752) -> (-4.3892, 9.0516) centre (0, 0) ccw projected
  arc A42 (-1.6991, 7.6367) -> (-4.3402, 9.0752) centre (-5.7463, 3.3497) ccw projected
  arc A43 (-1.0596, 6.774) -> (-1.6991, 7.6367) centre (-3.8299, 5.389) ccw projected
  arc A44 (-0.9641, 6.5068) -> (-1.0596, 6.774) centre (-2.0212, 6.2798) ccw projected
  line L8 (-0.8355, 5.6384) -> (-0.9641, 6.5068) projected
  arc A45 (0.8355, 5.6384) -> (-0.8355, 5.6384) centre (0, 0) ccw projected
  line L9 (0.9641, 6.5068) -> (0.8355, 5.6384) projected
  arc A46 (1.0596, 6.774) -> (0.9641, 6.5068) centre (2.0212, 6.2798) ccw projected
  arc A47 (1.6991, 7.6367) -> (1.0596, 6.774) centre (3.8299, 5.389) ccw projected
  arc A48 (4.3402, 9.0752) -> (1.6991, 7.6367) centre (5.7463, 3.3497) ccw projected
  arc A49 (4.3892, 9.0516) -> (4.3402, 9.0752) centre (0, 0) ccw projected
  arc A50 (4.9113, 6.0898) -> (4.3892, 9.0516) centre (-0.9639, 6.5812) ccw projected
  arc A51 (4.6355, 5.052) -> (4.9113, 6.0898) centre (1.8254, 6.3543) ccw projected
  arc A52 (4.4861, 4.8107) -> (4.6355, 5.052) centre (3.6495, 5.4956) ccw projected
  line L10 (3.8874, 4.1687) -> (4.4861, 4.8107) projected
  arc A53 (4.9292, 2.8623) -> (3.8874, 4.1687) centre (0, 0) ccw projected
  line L11 (5.6883, 3.3032) -> (4.9292, 2.8623) projected
  arc A54 (5.9568, 3.3951) -> (5.6883, 3.3032) centre (6.1699, 2.3351) ccw projected
  arc A55 (7.03, 3.433) -> (5.9568, 3.3951) centre (6.6011, 0.3656) ccw projected
  arc A56 (9.8014, 2.265) -> (7.03, 3.433) centre (6.2017, -2.4041) ccw projected
  arc A57 (9.8135, 2.2119) -> (9.8014, 2.265) centre (0, 0) ccw projected
  arc A58 (7.8233, -0.0429) -> (9.8135, 2.2119) centre (4.5444, 4.8569) ccw projected
  arc A59 (6.84, -0.4743) -> (7.8233, -0.0429) centre (6.1061, 2.5347) ccw projected
  arc A60 (6.5582, -0.508) -> (6.84, -0.4743) centre (6.5721, 0.5731) ccw projected
  line L12 (5.683, -0.4402) -> (6.5582, -0.508) projected
  arc A61 (5.3112, -2.0692) -> (5.683, -0.4402) centre (0, 0) ccw projected
  line L13 (6.1291, -2.3878) -> (5.3112, -2.0692) projected
  arc A62 (6.3684, -2.5404) -> (6.1291, -2.3878) centre (5.6726, -3.3679) ccw projected
  arc A63 (7.0672, -3.3558) -> (6.3684, -2.5404) centre (4.4016, -4.933) ccw projected
  arc A64 (7.8819, -6.2508) -> (7.0672, -3.3558) centre (1.9871, -6.3477) ccw projected
  circle A65 centre (0, 0) radius 1.995 projected
equation "\"d4\" = d3"
equation "\"d5\" = d4"
properties part number "歯車m2.z7(z19)" material "アルミニウム 2014-T4"
